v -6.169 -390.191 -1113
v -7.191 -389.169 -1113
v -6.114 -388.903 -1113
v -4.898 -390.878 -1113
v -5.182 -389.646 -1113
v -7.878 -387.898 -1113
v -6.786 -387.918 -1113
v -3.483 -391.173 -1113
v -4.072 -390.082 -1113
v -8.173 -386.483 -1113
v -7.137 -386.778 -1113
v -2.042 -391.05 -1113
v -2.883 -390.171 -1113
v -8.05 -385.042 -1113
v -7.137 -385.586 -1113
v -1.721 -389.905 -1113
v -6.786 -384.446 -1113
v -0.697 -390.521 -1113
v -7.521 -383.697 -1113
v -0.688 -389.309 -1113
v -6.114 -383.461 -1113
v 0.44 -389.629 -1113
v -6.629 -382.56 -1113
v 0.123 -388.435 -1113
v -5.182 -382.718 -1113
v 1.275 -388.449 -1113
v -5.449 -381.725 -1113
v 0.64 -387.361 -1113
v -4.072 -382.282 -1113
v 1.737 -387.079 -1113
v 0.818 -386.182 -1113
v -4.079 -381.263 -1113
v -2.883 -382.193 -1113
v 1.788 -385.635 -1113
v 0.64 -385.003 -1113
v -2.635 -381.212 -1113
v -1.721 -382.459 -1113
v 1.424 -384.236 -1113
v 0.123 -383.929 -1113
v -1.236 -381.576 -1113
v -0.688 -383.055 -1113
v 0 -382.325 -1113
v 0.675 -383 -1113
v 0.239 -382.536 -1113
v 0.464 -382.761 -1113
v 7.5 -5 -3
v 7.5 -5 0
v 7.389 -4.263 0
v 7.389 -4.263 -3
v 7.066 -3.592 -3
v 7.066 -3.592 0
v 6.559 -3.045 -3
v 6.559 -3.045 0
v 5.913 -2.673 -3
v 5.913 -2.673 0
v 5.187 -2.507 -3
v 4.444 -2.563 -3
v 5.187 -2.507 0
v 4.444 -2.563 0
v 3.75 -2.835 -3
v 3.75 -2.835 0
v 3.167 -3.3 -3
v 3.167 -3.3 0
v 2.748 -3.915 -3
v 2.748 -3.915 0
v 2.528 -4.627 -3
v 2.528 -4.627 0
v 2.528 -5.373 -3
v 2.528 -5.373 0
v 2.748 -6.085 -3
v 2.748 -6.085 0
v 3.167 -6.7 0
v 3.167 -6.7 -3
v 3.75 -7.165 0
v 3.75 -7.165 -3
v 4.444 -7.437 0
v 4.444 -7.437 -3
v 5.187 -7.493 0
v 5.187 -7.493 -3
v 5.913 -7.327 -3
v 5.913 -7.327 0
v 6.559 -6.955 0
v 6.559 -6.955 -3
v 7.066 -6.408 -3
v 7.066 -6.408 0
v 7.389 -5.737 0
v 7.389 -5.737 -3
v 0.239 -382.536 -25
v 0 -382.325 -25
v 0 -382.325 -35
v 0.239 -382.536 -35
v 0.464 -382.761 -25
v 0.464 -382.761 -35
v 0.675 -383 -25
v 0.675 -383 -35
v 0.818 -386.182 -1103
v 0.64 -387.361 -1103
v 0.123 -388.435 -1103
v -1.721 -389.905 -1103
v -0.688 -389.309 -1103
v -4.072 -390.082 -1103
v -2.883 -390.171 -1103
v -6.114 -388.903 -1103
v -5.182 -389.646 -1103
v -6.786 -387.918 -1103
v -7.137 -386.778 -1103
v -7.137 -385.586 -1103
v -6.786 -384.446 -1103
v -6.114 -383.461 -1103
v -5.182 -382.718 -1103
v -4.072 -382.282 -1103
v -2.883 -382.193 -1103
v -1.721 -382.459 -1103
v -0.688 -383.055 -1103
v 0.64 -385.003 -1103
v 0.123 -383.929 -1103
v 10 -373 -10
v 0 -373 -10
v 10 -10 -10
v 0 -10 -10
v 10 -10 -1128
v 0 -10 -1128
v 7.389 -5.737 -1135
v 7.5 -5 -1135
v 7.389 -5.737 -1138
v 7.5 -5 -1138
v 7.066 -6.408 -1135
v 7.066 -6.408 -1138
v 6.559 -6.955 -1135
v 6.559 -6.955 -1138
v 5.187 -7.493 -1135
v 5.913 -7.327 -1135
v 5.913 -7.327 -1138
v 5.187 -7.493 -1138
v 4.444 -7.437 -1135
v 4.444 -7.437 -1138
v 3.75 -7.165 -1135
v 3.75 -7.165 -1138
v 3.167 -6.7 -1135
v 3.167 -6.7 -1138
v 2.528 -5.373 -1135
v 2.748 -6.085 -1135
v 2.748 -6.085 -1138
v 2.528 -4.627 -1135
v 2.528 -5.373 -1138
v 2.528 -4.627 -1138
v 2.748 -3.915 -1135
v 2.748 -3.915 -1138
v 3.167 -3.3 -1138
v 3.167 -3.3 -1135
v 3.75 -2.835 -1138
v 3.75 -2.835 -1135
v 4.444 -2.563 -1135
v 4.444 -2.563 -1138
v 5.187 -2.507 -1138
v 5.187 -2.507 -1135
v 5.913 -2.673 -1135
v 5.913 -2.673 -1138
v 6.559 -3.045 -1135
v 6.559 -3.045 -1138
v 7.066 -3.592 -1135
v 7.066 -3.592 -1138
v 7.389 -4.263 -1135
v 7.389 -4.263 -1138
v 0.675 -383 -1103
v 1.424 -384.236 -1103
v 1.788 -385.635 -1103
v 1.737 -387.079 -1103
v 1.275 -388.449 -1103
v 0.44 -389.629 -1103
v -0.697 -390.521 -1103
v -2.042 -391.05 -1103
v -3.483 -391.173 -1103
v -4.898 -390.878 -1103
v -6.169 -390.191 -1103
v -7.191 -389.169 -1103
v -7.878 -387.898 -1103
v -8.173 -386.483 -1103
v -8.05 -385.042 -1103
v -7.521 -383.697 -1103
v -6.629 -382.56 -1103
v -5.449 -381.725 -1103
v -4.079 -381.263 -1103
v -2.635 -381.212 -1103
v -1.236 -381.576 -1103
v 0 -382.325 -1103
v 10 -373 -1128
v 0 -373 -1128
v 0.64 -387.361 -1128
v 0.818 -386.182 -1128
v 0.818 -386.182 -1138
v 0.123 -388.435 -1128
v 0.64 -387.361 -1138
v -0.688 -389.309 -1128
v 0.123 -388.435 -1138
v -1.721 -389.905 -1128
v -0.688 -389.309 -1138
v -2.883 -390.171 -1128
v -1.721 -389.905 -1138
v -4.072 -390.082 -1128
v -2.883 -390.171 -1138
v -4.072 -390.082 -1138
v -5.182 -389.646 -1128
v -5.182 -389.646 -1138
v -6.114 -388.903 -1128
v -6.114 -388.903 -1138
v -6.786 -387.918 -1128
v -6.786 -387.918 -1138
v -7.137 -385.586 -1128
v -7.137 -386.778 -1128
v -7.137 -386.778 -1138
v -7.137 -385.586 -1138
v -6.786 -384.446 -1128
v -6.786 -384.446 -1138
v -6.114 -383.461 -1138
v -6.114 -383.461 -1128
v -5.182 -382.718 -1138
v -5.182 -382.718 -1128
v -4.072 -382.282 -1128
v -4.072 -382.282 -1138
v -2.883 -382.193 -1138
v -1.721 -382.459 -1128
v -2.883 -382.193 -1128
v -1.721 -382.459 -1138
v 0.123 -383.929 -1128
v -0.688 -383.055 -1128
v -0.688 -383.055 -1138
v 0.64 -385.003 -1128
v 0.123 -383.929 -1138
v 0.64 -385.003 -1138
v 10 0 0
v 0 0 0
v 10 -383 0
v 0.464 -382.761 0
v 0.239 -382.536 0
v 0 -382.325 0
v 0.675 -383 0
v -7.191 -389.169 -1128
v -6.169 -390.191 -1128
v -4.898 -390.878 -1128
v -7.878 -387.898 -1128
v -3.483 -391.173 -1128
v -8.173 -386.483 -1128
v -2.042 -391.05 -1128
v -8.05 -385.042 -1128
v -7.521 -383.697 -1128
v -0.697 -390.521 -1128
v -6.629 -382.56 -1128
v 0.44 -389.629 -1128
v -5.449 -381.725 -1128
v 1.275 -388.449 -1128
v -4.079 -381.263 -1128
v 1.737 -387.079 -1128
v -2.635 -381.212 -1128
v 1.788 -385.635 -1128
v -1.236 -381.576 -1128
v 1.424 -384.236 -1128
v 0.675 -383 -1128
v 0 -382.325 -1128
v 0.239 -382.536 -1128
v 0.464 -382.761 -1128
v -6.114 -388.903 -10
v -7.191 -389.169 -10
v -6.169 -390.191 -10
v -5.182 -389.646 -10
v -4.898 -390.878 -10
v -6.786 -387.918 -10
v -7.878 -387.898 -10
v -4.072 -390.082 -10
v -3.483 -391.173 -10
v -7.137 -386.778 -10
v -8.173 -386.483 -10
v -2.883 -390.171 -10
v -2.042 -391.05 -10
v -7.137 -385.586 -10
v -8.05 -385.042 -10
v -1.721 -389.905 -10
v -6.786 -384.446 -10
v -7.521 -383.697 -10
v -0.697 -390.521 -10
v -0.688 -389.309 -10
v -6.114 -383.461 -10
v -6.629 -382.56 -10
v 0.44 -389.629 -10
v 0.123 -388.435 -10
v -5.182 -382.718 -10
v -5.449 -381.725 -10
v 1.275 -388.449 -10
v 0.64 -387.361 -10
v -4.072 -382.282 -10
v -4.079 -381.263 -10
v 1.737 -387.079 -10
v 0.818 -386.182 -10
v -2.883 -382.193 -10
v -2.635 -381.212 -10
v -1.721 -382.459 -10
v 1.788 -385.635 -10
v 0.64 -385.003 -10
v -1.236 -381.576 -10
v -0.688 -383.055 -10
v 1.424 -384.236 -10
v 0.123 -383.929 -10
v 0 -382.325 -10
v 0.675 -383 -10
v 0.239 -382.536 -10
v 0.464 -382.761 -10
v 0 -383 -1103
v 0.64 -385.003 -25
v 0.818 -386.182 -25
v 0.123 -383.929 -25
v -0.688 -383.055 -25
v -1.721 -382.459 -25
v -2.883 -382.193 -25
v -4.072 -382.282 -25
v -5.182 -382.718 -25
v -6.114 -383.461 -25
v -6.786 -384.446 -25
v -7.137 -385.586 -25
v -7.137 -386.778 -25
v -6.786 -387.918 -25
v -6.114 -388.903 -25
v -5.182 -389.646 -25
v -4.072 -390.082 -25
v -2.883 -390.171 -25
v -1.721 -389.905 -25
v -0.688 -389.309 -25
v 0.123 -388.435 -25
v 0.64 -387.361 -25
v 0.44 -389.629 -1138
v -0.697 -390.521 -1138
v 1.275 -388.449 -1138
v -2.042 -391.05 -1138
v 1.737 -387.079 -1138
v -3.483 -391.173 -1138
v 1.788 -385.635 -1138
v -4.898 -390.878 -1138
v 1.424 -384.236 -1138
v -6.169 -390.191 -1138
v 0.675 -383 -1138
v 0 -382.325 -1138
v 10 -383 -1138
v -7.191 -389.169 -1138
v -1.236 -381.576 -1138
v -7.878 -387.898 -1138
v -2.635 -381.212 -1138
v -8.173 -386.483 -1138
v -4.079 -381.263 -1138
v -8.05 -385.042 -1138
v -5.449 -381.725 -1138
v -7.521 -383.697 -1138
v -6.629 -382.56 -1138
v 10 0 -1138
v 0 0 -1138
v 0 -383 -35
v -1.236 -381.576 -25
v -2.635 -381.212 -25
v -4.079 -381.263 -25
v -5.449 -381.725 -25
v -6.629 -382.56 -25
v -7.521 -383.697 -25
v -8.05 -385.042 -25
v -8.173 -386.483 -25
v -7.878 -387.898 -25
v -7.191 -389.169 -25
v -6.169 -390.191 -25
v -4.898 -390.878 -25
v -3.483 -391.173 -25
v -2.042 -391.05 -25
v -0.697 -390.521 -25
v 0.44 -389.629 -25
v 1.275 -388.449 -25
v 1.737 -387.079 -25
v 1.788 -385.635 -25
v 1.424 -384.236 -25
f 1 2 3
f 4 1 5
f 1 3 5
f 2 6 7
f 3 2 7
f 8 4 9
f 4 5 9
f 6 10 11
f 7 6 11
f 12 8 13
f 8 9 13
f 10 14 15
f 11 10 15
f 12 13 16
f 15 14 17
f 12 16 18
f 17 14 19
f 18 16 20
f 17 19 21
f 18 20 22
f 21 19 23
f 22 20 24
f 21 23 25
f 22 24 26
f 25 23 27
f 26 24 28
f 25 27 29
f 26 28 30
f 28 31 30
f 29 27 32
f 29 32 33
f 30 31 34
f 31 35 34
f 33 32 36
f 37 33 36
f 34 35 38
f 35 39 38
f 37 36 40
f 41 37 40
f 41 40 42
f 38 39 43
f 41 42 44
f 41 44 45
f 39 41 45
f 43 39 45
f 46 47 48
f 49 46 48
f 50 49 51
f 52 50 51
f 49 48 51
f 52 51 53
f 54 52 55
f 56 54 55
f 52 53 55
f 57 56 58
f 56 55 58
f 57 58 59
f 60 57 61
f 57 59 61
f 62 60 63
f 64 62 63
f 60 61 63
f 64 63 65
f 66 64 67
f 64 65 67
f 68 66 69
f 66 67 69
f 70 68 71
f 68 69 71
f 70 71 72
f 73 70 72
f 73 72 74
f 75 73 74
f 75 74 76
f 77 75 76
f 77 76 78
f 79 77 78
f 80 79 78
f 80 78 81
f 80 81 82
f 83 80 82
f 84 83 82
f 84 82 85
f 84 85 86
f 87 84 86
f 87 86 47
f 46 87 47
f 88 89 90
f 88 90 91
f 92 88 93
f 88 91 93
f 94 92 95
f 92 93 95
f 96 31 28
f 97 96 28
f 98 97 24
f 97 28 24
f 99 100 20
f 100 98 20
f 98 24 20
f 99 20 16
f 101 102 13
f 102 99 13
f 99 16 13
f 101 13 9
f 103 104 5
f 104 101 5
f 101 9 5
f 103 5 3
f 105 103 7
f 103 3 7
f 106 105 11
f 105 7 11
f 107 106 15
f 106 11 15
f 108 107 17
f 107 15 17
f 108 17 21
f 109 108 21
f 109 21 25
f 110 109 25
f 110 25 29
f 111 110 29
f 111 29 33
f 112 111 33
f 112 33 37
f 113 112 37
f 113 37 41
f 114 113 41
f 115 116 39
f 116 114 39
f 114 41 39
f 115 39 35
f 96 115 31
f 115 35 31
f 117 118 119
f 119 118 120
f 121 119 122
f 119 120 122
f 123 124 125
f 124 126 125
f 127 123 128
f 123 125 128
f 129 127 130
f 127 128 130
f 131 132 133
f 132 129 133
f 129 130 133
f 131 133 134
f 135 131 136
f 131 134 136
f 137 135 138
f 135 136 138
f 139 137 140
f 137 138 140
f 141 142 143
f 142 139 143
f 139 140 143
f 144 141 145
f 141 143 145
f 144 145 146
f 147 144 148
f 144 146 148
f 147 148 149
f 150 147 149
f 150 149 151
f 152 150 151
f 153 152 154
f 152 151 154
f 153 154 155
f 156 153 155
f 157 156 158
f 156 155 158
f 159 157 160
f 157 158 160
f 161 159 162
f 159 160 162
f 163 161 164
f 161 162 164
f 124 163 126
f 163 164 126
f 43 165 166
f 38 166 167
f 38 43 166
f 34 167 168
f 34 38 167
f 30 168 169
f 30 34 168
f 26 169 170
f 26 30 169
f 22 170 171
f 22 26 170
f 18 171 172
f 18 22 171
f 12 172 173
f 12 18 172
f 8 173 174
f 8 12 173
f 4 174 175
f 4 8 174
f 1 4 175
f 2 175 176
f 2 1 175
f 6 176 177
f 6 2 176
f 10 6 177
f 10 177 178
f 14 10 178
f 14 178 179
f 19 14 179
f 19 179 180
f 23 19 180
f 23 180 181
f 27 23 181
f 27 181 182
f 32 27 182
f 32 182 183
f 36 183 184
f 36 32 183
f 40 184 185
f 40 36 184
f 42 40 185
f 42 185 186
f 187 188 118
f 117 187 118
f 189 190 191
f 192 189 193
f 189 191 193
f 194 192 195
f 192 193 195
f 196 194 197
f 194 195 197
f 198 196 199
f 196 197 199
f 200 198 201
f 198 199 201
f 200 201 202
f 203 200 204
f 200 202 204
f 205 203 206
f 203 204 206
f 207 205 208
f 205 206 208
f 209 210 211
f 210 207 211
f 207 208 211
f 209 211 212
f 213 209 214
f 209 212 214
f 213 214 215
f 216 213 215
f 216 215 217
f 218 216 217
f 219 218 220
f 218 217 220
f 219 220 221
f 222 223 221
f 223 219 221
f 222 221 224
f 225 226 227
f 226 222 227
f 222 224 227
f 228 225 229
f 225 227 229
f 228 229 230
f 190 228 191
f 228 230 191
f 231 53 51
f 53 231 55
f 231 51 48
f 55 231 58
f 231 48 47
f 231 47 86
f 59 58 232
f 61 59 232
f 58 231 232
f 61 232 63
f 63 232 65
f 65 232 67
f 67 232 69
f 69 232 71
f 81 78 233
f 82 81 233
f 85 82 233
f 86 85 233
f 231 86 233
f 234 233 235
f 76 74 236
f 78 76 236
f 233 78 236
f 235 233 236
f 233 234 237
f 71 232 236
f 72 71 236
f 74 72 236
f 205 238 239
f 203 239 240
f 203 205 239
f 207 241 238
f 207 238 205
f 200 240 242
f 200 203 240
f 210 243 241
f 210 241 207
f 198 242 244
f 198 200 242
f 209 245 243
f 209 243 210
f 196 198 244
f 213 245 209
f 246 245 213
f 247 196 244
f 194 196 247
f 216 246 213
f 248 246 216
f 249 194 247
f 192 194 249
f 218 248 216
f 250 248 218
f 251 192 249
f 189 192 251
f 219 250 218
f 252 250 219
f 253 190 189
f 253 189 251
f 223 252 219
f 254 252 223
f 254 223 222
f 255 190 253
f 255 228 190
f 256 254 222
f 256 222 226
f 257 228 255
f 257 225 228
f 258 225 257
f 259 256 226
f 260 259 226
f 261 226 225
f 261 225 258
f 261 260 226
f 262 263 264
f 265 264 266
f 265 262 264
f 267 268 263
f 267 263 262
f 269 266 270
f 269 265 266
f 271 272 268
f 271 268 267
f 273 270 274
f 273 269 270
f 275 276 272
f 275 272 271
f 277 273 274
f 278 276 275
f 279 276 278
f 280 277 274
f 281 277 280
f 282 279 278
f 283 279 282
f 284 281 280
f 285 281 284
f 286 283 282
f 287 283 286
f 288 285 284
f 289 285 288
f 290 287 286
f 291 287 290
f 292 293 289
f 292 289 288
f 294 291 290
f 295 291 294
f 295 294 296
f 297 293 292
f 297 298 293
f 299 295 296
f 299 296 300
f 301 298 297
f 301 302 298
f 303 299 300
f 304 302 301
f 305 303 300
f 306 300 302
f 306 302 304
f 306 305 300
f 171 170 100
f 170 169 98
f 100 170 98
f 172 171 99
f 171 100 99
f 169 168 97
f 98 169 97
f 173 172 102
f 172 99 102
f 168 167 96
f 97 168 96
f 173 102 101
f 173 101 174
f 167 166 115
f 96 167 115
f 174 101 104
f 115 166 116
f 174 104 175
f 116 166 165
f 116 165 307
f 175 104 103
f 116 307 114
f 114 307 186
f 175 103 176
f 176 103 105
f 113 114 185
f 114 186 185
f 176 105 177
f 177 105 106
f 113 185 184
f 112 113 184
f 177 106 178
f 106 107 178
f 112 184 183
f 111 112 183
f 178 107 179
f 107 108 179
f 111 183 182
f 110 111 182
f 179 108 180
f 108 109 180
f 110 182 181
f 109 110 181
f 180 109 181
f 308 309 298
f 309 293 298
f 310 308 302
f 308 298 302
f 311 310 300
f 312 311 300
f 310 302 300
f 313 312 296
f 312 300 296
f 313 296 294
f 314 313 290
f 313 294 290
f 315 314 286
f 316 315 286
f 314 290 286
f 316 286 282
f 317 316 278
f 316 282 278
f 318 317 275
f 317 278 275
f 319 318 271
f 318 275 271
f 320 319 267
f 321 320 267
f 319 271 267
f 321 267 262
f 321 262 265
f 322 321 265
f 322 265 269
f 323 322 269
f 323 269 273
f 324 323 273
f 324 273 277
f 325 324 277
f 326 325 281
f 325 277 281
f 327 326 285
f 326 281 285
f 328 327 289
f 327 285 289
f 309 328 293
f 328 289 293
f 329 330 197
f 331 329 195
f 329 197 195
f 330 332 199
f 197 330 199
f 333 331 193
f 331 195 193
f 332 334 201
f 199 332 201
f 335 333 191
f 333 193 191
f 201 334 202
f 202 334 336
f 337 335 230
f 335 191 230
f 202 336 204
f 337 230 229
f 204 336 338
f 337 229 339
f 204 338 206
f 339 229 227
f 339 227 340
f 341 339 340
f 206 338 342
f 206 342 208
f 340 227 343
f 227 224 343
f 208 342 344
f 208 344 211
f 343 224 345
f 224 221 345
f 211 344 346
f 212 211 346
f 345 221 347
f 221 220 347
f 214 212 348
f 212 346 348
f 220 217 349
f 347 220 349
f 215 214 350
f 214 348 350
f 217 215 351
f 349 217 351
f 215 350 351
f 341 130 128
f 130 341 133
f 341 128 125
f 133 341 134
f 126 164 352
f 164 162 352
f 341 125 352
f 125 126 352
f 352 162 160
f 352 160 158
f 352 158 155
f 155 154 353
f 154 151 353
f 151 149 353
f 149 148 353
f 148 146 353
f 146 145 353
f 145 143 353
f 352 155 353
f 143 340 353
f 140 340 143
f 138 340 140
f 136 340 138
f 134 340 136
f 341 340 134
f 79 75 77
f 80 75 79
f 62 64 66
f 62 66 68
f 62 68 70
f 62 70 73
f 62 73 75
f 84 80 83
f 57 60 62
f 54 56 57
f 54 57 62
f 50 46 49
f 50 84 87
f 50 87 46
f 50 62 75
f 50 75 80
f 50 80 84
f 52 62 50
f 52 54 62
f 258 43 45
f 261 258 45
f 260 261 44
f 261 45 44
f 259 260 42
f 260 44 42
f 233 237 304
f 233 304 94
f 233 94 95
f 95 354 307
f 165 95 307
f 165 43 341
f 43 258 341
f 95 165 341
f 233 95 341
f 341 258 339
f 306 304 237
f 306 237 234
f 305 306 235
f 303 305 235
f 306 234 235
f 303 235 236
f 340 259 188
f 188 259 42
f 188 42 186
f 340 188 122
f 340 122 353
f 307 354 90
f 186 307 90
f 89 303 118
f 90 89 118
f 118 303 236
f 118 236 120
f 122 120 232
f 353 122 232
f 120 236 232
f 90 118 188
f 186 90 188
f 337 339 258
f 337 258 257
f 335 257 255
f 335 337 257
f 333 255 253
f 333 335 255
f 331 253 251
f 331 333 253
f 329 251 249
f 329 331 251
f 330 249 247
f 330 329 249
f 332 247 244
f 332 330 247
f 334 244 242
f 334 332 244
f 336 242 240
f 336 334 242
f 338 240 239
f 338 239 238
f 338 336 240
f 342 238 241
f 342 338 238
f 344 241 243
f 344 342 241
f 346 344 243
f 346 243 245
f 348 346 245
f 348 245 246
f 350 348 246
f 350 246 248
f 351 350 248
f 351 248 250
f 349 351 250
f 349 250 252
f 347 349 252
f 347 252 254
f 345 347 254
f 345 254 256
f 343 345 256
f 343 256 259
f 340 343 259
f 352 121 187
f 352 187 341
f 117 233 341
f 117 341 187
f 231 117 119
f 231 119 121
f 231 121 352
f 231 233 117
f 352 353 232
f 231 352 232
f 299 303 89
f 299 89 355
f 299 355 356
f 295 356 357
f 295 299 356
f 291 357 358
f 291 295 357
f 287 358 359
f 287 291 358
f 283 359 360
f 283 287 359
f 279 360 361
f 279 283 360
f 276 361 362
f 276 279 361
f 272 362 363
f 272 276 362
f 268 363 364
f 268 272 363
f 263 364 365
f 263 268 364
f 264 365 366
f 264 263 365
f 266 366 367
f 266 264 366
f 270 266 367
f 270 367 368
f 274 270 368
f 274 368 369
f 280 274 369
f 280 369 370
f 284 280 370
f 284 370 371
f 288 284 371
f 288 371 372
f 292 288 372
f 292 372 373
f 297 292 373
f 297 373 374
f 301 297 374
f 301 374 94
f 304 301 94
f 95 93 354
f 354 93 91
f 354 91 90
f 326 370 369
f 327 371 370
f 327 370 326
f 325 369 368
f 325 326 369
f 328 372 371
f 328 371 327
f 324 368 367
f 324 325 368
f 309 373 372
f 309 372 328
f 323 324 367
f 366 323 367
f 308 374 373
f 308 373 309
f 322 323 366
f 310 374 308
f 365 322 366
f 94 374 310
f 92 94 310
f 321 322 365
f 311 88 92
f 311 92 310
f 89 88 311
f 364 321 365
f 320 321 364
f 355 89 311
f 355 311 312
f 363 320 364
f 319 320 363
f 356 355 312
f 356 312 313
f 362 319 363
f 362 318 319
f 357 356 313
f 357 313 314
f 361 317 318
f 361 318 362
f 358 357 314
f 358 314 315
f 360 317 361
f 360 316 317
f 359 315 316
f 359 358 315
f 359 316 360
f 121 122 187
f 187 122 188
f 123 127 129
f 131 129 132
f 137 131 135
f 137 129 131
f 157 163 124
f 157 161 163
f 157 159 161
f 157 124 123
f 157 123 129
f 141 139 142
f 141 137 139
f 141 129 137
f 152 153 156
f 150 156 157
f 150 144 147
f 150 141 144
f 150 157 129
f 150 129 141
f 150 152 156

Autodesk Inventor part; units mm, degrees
ref_plane "YZ Plane" through (0, 0, 0) normal (1, 0, 0) x (0, 1, 0)
ref_plane "XZ Plane" through (0, 0, 0) normal (0, 1, 0) x (-1, 0, 0)
ref_plane "XY Plane" through (0, 0, 0) normal (0, 0, 1) x (1, 0, 0)
sketch "Sketch1" plane through (0, 0, 0) normal (1, 0, 0) x (0, 1, 0)
  line L0 (0, 0) -> (-383, 0)
  line L1 (-383, 0) -> (-383, -1138)
  line L2 (-383, -1138) -> (0, -1138)
  line L3 (0, -1138) -> (0, 0)
  line L4 (-373, -1128) -> (-373, -10)
  line L5 (-373, -10) -> (-10, -10)
  line L6 (-10, -10) -> (-10, -1128)
  line L7 (-10, -1128) -> (-373, -1128)
  dimension "d0" = 383
  dimension "d1" = 1138
  dimension "d2" = 10
extrude "Extrusion1" add sketch "Sketch1" along normal blind 10
sketch "Sketch2" plane through (0, -383, 0) normal (0, 0, 1) x (1, 0, 0)
  line L0 (0, 383) -> (0, 0) projected
  line L1 (0, 0) -> (10, 0) projected
  line L2 (10, 383) -> (10, 0) projected
  line L3 (0, 383) -> (10, 383) projected
  line L4 (0, 0) -> (-3.182, -3.182)
  line L5 (0, 0) -> (4.5, 0) construction
  line L6 (0, 383) -> (0, 0) projected
  circle A0 centre (-3.182, -3.182) radius 5
  circle A1 centre (-3.182, -3.182) radius 4
  dimension "d5" = 4.5
  dimension "d6" = 135
  dimension "d7" = 1
  dimension "d10" = 10
extrude "Extrusion2" add sketch "Sketch2" against normal blind 35 contours A0 L1 L0 | L0 L1 A0
ref_plane "Work Plane1" through (0, 0, -569) normal (0, 0, 1) x (1, 0, 0)
mirror "Mirror1" about plane through (0, 0, -569) normal (0, 0, 1) of "Extrusion2"
fillet "Fillet1" [suppressed]
ref_plane "Work Plane2" through (0, -383, -1113) normal (0, 0, 1) x (1, 0, 0)
sketch "Sketch3" plane through (0, -383, -1113) normal (0, 0, 1) x (1, 0, 0)
  arc A0 (0, 0.6748) -> (0.6748, 0) centre (-3.182, -3.182) ccw projected
  circle A1 centre (-3.182, -3.182) radius 4 projected
  line L0 (0.6748, 0) -> (10, 0) projected
  circle A2 centre (-3.182, -3.182) radius 5
  point P0 (0, 383)
  point P1 (0, 0.6748)
extrude "Extrusion3" cut sketch "Sketch3" against normal blind 15
sketch "Sketch4" plane through (0, 0, 0) normal (0, 0, 1) x (1, 0, 0)
  circle A0 centre (-3.182, -386.182) radius 4 projected
  arc A1 (0, -382.3252) -> (0.6748, -383) centre (-3.182, -386.182) ccw projected
  circle A2 centre (-3.182, -386.182) radius 4 projected
  line L0 (0.6748, -383) -> (10, -383) projected
  circle A3 centre (-3.182, -386.182) radius 5
  point P0 (0, 0)
  point P1 (0, -382.3252)
extrude "Extrusion4" cut sketch "Sketch4" against normal blind 10
sketch "Sketch5" plane through (0, -383, -35) normal (0, 0, -1) x (-1, 0, 0)
  circle A0 centre (3.182, -3.182) radius 4 projected
  arc A1 (-0.6748, 0) -> (0, 0.6748) centre (3.182, -3.182) ccw projected
  circle A2 centre (3.182, -3.182) radius 5
  point P0 (0, 383)
  point P1 (0, 0.6748)
extrude "Extrusion5" cut sketch "Sketch5" against normal blind 10
sketch "Sketch6" plane through (0, 0, 0) normal (0, 0, 1) x (1, 0, 0)
  arc A0 (0.6748, -383) -> (0, -382.3252) centre (-3.182, -386.182) ccw projected
  line L0 (0.6748, -383) -> (10, -383) projected
  line L1 (10, 0) -> (10, -383) projected
  line L2 (0, 0) -> (10, 0) projected
  line L3 (0, 0) -> (0, -382.3252) projected
  line L4 (10, -383) -> (10, 0) construction
  line L5 (0, -10) -> (10, -10) construction
  line L6 (10, 0) -> (0, -10) construction
  line L7 (0, 0) -> (10, 0) construction
  line L8 (0, 0) -> (10, -10) construction
  circle A1 centre (5, -5) radius 2.5
  dimension "d19" = 5
extrude "Extrusion6" cut sketch "Sketch6" against normal blind 3 contours A1
sketch "Sketch7" plane through (5, -5, -3) normal (0, 0, 1) x (1, 0, 0)
  circle A0 centre (0, 0) radius 2.5 projected
  circle A1 centre (0, 0) radius 7.5
  line L0 (13, -13) -> (-13, -13)
  line L1 (-13, -13) -> (-13, 13)
  line L2 (-13, 13) -> (13, 13)
  line L3 (13, 13) -> (13, -13)
  line L4 (13, -13) -> (-13, 13) construction
  line L5 (-13, -13) -> (13, 13) construction
  point P0 (-5, 5)
  dimension "d22" = 15
  dimension "d25" = 26
  dimension "d26" = 26
extrude "Extrusion7" [suppressed]
mirror "Mirror2" about plane through (0, 0, -569) normal (0, 0, 1) of "Extrusion6"
equation "\"d25\" = d26"
properties part number "porta1"
